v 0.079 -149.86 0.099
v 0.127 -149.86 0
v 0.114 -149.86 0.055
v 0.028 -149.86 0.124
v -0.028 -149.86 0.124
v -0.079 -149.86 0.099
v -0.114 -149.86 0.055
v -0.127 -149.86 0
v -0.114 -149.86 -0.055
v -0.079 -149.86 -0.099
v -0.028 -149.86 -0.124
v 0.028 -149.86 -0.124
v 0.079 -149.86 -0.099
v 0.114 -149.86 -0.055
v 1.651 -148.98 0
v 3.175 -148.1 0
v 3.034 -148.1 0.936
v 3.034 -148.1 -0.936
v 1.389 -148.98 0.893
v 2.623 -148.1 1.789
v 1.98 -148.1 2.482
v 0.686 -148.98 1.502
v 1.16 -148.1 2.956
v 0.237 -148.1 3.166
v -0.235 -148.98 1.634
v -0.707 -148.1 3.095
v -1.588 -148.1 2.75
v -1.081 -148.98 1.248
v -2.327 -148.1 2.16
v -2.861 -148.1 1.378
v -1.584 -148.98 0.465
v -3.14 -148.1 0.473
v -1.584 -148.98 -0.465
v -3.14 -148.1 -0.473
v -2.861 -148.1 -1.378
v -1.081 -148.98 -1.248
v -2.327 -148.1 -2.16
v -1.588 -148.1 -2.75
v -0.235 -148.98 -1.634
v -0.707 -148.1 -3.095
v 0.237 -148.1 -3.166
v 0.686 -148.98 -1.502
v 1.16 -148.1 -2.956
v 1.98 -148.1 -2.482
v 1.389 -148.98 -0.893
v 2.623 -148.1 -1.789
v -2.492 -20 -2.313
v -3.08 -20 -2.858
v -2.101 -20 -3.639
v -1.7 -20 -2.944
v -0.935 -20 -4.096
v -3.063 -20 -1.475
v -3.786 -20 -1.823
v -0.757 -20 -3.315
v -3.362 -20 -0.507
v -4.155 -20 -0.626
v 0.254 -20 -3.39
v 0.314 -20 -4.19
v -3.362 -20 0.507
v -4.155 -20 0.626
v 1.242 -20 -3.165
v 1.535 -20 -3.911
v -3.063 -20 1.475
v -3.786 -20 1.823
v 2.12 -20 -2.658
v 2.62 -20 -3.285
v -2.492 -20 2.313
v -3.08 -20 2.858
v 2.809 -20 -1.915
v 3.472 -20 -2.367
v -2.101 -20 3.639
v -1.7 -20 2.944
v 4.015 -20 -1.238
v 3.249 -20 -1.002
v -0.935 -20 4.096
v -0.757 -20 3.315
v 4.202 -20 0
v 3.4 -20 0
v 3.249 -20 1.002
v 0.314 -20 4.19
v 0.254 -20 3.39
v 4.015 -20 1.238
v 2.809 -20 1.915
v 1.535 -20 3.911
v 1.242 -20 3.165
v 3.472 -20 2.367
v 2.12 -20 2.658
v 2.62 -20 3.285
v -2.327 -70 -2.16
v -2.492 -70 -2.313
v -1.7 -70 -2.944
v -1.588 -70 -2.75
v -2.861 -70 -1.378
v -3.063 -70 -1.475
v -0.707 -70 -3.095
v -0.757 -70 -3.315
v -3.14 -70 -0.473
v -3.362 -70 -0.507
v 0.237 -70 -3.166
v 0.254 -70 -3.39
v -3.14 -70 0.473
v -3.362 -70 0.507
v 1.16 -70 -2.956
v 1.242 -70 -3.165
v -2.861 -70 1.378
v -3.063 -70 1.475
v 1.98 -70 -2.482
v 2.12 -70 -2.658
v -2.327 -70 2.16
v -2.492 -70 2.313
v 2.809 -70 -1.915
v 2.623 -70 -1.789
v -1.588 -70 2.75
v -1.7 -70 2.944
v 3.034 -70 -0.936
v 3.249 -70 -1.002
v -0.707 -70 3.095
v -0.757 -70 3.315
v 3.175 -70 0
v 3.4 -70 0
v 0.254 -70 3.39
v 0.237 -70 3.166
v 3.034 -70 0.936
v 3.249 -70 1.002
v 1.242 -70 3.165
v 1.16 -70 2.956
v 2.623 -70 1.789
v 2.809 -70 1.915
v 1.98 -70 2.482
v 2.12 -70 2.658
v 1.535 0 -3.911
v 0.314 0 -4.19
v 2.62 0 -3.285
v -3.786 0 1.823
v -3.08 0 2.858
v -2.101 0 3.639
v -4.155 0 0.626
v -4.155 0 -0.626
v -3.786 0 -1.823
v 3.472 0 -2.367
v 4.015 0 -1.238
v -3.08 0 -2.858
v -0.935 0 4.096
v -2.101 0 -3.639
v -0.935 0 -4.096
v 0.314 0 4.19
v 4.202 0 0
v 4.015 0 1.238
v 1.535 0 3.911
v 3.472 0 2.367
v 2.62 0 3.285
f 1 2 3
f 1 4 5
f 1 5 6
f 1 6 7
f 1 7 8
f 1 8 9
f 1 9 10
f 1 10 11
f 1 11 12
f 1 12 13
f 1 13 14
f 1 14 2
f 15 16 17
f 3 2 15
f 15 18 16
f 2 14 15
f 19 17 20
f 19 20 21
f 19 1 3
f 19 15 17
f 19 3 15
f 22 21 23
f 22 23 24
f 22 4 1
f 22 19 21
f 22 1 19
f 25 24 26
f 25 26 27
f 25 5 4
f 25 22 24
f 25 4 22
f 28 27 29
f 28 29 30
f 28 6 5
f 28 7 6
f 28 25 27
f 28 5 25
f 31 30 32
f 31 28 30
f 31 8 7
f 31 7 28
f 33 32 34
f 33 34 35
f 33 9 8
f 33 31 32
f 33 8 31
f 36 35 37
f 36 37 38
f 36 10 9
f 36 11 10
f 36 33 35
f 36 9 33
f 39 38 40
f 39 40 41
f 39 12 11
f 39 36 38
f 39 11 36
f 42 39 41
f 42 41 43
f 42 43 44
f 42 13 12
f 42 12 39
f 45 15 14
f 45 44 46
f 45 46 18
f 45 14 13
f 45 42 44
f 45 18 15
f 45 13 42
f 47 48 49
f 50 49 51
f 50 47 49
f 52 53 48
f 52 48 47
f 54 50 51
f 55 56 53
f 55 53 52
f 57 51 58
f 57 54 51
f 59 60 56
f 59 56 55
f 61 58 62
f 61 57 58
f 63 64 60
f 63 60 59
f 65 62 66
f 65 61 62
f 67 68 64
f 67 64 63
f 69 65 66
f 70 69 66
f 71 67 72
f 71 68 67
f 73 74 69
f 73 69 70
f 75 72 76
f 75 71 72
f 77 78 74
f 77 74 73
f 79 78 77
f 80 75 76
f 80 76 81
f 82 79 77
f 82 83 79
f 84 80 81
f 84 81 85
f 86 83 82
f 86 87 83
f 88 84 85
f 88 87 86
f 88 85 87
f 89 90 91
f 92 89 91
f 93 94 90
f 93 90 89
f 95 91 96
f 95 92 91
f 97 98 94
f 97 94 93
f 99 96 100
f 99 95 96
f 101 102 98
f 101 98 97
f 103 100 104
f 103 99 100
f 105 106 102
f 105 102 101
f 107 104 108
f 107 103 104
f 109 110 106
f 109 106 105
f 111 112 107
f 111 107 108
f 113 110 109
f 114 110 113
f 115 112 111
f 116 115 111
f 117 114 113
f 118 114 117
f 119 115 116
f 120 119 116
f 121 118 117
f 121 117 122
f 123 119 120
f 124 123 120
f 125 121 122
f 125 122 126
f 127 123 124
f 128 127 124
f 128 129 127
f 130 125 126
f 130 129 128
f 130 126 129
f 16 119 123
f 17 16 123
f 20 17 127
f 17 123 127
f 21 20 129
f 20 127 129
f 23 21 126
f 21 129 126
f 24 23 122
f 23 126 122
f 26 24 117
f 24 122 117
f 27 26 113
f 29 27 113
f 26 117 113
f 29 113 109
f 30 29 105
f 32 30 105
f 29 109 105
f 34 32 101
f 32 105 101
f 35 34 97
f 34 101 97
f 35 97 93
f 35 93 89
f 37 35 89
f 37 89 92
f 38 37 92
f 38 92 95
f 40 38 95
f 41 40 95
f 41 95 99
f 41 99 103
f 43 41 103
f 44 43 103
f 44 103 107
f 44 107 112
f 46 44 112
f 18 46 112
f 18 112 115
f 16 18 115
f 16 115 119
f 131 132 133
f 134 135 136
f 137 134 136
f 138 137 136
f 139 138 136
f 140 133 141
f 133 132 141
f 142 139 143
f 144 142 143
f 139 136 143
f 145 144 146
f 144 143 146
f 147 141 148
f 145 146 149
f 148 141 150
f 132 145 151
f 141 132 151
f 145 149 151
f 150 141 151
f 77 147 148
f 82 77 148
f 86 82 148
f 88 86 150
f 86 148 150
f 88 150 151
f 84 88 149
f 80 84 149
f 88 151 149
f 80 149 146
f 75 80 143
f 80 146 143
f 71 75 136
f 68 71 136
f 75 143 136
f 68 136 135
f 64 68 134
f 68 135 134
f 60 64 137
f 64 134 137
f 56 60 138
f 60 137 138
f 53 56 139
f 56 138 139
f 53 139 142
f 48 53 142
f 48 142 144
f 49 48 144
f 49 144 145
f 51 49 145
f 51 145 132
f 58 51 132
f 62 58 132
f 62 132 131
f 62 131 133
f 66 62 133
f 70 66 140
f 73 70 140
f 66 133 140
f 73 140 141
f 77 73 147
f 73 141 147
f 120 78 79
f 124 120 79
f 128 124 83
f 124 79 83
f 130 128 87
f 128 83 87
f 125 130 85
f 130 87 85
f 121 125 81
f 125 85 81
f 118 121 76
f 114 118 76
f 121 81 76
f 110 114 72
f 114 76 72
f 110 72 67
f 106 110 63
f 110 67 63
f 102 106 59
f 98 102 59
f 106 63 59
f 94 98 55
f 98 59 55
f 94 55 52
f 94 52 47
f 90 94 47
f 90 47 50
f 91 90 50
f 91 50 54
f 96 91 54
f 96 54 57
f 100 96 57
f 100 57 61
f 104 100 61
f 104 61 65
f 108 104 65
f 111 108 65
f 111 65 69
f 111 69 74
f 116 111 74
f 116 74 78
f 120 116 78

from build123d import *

# Parameters (mm, degrees)
F0_R     = 3.175
F1_DEPTH = 149.86
F2_SIZE2 = 3.048
F2_SIZE  = 1.7597636205
F3_R     = 3.4
F4_DEPTH = 70
F5_R     = 4.2017465395
F6_DEPTH = 20


with BuildPart() as f1:
    # F0 (on Front) → F1 (new body)
    with BuildSketch(Plane.XZ):
        Circle(F0_R)
    extrude(amount=F1_DEPTH)

    # F2
    f2_edges = [f1.edges().sort_by_distance(p)[0] for p in [
        (-3.175, -149.86, 0),
    ]]
    f2_side = f1.faces().sort_by_distance((-3.175, -74.93, 0))[0]
    chamfer(f2_edges, length=F2_SIZE, length2=F2_SIZE2, reference=f2_side)

    # F3 (on Front) → F4 (join)
    with BuildSketch(Plane.XZ):
        Circle(F3_R)
    extrude(amount=F4_DEPTH)

    # F5 (on Front) → F6 (join)
    with BuildSketch(Plane.XZ):
        Circle(F5_R)
    extrude(amount=F6_DEPTH)


solid = f1.part
